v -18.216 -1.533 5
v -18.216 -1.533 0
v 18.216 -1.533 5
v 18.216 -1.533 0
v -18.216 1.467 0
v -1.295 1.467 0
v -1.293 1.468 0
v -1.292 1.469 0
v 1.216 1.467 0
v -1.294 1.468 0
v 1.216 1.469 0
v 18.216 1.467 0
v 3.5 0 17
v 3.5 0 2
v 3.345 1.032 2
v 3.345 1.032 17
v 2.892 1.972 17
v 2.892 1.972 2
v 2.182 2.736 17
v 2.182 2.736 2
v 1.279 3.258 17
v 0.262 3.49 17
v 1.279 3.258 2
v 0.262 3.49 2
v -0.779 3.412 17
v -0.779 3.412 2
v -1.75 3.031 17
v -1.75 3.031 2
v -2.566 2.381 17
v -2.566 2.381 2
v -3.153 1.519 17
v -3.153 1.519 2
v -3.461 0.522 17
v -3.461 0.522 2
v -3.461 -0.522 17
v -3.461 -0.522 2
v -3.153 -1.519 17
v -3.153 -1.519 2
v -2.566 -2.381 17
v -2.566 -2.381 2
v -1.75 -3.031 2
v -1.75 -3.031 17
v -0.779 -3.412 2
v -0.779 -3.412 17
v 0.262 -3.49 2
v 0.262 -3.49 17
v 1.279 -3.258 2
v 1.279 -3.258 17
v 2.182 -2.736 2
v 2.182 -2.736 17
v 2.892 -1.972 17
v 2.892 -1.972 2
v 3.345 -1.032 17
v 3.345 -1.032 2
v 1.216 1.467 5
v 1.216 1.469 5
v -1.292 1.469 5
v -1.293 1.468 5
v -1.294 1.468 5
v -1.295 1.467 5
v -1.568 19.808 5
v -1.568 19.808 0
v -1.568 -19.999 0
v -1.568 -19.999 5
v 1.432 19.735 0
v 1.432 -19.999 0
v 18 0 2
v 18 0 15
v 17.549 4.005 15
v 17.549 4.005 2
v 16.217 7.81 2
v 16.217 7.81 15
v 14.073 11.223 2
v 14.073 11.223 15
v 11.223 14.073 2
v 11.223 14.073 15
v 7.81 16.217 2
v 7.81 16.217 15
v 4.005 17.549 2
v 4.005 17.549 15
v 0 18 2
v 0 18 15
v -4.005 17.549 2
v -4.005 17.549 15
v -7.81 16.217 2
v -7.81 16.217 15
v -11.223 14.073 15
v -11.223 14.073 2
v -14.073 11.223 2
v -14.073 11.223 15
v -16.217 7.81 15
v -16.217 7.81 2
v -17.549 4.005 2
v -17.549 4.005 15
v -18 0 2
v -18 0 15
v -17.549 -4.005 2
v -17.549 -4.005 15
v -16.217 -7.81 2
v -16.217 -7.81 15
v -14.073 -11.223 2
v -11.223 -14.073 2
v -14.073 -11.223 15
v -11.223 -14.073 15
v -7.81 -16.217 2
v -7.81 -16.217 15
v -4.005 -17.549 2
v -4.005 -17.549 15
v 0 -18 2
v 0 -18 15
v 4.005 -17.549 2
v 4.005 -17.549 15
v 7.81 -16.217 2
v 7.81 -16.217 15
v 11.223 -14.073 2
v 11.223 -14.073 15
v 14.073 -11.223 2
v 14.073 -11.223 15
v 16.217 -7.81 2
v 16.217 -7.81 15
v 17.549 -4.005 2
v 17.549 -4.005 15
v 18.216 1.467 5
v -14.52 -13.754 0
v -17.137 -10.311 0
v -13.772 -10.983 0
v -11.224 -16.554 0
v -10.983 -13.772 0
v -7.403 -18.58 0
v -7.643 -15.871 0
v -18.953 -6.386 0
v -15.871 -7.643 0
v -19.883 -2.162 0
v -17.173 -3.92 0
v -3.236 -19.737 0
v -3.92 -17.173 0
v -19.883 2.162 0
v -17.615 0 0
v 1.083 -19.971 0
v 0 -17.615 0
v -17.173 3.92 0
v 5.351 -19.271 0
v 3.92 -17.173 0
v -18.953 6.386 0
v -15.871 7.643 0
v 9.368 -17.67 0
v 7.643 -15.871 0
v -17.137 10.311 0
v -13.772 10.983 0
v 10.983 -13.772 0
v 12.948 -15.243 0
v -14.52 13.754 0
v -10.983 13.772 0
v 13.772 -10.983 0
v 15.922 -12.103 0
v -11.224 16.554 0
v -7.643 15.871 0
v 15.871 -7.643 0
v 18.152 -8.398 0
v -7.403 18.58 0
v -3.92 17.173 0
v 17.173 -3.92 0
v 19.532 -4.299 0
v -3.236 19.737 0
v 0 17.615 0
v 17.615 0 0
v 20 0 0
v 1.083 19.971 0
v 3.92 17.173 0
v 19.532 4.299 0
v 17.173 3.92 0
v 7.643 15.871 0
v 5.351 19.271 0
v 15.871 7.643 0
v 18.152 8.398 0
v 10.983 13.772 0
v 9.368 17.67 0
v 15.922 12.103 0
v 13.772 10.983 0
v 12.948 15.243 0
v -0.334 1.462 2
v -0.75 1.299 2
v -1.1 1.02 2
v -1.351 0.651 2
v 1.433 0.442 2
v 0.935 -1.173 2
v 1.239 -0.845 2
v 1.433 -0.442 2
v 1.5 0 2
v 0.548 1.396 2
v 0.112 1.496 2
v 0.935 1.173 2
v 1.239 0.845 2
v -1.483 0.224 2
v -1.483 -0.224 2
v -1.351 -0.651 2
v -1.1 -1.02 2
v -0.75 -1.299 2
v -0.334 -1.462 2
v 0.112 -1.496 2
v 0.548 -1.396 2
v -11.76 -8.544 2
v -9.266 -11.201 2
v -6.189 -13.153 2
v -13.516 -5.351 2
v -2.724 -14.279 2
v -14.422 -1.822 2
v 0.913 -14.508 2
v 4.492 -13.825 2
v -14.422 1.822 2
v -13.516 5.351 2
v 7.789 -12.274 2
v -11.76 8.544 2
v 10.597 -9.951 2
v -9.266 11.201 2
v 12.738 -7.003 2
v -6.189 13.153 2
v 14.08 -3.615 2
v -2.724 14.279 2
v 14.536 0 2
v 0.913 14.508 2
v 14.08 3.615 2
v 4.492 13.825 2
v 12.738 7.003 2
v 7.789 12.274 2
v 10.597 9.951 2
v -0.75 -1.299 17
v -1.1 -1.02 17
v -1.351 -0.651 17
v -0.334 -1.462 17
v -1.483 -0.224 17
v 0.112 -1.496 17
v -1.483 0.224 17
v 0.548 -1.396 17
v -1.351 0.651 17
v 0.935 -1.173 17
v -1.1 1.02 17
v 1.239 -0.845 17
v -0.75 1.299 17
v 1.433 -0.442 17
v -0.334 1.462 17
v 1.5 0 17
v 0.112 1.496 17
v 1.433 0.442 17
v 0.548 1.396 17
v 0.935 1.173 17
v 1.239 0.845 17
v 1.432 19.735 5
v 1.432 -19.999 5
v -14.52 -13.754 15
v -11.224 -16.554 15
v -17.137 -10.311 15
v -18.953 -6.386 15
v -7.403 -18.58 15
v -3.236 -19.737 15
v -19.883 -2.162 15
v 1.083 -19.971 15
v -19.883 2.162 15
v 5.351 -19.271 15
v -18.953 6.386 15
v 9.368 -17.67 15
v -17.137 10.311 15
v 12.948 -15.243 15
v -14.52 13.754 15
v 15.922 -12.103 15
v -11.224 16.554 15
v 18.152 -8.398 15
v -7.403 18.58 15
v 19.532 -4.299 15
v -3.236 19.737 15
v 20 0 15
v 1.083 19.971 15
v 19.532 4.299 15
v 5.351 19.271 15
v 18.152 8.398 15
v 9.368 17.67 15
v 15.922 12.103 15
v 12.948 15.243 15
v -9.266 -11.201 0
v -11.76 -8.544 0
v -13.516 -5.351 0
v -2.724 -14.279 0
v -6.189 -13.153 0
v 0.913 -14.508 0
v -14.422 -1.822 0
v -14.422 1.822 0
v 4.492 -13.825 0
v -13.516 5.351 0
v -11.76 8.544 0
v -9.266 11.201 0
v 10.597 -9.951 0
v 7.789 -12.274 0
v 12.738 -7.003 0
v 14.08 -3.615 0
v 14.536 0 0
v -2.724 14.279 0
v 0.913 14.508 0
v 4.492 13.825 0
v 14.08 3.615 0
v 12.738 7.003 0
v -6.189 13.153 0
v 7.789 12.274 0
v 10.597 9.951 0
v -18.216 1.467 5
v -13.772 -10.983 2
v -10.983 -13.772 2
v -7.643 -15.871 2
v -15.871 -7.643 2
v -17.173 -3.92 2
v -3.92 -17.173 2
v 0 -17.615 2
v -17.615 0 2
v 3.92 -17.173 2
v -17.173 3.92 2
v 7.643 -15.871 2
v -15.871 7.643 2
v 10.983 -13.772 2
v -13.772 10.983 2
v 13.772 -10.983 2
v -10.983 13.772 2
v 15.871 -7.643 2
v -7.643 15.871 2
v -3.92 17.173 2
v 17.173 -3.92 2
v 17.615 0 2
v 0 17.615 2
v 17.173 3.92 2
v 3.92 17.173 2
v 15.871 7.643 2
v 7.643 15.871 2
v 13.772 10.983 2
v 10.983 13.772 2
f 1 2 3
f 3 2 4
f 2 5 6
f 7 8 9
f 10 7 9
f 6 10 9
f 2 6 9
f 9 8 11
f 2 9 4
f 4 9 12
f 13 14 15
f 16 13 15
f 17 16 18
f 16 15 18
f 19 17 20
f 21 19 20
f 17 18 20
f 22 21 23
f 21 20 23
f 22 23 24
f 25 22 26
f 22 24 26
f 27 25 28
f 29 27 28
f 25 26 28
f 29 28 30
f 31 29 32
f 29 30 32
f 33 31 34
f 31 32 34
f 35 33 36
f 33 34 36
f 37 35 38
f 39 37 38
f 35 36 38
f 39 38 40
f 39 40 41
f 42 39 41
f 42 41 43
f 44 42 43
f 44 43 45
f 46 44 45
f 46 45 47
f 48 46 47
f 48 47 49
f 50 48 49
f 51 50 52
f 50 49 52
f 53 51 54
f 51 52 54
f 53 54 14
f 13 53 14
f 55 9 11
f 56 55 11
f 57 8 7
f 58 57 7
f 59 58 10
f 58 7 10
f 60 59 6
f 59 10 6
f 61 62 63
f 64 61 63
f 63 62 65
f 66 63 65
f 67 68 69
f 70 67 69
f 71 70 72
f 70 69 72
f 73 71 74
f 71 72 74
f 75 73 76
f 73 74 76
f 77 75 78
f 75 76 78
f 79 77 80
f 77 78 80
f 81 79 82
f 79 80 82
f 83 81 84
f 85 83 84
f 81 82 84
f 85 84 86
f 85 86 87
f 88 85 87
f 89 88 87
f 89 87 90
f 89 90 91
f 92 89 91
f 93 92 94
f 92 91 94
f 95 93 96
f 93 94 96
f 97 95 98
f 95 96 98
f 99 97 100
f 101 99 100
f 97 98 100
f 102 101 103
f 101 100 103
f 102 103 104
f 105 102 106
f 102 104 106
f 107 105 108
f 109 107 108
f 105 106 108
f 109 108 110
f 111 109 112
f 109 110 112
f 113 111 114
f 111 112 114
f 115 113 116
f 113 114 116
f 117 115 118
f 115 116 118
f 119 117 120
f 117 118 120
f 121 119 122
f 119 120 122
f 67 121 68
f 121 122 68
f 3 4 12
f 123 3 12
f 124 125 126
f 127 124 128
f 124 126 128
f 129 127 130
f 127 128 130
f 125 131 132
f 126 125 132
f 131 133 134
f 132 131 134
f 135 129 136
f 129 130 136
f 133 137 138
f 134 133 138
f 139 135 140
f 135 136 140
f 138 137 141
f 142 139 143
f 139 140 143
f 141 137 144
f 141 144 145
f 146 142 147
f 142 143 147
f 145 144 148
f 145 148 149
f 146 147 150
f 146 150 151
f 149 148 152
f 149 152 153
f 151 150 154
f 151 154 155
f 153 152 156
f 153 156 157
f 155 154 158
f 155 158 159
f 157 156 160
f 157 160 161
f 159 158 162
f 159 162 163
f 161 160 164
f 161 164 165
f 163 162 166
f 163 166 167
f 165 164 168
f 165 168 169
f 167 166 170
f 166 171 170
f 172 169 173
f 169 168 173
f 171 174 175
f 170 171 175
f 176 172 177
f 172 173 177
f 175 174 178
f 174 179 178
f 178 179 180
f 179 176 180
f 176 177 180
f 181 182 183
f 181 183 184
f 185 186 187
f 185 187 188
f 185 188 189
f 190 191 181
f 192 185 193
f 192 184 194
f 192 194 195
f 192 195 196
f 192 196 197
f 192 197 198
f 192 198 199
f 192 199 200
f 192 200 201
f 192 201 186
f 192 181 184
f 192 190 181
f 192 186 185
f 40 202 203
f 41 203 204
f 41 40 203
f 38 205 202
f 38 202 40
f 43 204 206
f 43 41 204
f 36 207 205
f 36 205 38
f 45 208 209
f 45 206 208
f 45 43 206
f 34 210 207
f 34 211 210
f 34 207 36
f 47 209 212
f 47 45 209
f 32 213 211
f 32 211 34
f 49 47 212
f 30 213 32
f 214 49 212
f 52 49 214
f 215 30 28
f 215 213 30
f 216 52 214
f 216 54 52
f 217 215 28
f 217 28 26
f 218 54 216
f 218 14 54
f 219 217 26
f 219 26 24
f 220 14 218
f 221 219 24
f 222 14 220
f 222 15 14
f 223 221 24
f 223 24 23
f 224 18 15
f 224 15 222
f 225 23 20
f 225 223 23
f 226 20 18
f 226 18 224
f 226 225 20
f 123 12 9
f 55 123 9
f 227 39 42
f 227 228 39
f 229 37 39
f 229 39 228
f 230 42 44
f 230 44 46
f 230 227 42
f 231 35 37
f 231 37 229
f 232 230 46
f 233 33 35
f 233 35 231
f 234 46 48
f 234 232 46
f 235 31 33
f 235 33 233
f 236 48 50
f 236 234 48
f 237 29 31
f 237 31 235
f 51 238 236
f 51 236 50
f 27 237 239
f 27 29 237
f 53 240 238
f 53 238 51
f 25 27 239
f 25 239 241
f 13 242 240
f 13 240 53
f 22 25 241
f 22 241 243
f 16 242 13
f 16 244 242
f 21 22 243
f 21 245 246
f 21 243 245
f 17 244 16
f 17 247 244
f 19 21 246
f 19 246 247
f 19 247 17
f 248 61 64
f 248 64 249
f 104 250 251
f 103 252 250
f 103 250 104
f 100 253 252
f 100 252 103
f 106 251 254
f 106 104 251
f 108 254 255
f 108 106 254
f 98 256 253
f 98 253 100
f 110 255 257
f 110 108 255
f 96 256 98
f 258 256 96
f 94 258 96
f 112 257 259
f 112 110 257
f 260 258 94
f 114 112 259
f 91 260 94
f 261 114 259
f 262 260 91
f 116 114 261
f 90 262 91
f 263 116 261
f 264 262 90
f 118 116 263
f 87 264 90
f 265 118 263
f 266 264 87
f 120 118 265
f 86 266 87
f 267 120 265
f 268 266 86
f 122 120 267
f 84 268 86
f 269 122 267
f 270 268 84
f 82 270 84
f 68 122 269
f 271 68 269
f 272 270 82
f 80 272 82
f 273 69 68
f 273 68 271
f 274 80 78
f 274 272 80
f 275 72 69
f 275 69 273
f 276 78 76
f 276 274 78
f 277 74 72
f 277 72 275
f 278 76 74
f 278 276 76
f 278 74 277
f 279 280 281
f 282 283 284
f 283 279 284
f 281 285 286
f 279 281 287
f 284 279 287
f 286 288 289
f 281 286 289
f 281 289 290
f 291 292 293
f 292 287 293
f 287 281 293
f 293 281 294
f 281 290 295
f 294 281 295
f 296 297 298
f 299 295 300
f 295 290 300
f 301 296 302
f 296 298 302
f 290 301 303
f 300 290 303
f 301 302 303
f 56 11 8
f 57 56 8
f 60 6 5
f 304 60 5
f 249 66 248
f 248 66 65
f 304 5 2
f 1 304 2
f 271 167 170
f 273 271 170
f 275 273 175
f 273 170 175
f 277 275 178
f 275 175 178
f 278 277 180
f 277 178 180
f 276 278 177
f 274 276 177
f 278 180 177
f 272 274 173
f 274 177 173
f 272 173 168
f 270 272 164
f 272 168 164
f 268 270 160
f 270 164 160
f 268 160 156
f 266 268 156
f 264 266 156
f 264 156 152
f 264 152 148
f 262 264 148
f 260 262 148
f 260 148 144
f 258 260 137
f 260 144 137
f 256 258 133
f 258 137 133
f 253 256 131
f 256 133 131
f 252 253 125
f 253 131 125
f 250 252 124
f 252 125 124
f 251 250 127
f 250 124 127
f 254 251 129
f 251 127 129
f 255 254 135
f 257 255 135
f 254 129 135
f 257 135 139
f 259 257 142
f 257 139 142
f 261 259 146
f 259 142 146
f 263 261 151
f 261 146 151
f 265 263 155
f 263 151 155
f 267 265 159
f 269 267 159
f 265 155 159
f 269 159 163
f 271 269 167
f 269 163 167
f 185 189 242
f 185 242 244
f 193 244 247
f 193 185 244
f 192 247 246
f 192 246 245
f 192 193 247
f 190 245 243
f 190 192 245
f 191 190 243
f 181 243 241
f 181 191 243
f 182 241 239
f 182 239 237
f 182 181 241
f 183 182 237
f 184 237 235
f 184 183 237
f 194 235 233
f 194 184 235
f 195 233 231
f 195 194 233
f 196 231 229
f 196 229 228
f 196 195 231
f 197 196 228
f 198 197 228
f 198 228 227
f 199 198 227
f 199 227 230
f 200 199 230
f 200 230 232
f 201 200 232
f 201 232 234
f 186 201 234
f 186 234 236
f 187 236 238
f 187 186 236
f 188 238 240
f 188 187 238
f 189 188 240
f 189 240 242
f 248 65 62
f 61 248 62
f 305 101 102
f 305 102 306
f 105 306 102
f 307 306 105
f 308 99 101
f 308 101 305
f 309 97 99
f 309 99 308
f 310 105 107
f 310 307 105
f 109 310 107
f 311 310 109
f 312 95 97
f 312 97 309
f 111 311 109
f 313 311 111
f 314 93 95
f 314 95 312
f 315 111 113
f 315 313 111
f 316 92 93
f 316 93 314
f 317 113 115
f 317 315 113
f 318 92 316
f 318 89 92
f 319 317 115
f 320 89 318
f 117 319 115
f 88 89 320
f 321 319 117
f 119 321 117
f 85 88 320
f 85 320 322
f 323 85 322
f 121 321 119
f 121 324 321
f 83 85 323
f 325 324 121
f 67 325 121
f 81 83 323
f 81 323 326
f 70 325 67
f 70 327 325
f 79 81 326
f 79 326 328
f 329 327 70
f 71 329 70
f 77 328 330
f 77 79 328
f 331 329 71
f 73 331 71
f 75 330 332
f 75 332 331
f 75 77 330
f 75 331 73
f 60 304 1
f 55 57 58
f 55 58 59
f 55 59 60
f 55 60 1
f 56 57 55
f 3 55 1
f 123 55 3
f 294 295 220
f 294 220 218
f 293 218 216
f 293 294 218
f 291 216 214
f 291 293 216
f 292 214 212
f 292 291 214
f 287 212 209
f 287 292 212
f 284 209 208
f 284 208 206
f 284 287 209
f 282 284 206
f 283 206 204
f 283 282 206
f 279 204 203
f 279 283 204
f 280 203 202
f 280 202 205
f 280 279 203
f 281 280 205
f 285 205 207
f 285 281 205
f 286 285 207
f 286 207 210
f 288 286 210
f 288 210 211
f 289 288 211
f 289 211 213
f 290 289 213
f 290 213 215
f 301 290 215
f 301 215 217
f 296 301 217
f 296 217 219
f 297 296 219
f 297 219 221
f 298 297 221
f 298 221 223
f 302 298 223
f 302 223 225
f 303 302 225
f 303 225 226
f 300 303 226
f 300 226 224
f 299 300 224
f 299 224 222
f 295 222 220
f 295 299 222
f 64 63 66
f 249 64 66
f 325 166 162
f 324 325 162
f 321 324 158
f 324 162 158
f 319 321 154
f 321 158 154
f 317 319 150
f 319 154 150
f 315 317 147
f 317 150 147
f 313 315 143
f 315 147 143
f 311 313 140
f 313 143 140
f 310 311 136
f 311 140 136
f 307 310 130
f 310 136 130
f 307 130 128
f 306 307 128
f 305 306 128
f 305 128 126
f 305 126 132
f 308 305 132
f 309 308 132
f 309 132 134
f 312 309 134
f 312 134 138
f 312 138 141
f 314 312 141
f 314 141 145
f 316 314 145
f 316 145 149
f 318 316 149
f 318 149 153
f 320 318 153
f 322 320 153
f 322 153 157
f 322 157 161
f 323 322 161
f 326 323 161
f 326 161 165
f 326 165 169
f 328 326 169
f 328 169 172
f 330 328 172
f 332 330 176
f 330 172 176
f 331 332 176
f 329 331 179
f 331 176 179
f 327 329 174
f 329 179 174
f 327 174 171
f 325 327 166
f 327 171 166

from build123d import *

# Parameters (mm, degrees)
F0_R      = 20
F1_DEPTH  = 15
F2_R      = 18
F3_DEPTH  = 13
F4_R      = 3.5
F4_R_2    = 1.5
F5_DEPTH  = 15
F6_R      = 17.615069
F6_R_2    = 14.536454
F7_DEPTH  = 25
F8_DEPTH  = 25
F9_W      = 3
F9_H      = 19.99929
F10_DEPTH = 5
F12_DEPTH = 5


with BuildPart() as f1:
    # F0 (on Top) → F1 (new body)
    with BuildSketch(Plane.XY):
        Circle(F0_R)
    extrude(amount=F1_DEPTH)

    # F2 (on face) → F3 (cut)
    with BuildSketch(Plane.XY.offset(15)):
        Circle(F2_R)
    extrude(amount=-F3_DEPTH, mode=Mode.SUBTRACT)

    # F4 (on face) → F5 (join)
    with BuildSketch(Plane.XY.offset(2)):
        Circle(F4_R)
        Circle(F4_R_2, mode=Mode.SUBTRACT)
    extrude(amount=F5_DEPTH)

    # F6 (on face) → F7 (cut)
    with BuildSketch(Plane(origin=(0, 0, 0), x_dir=(1, 0, 0), z_dir=(0, 0, -1))):
        Circle(F6_R)
        Circle(F6_R_2, mode=Mode.SUBTRACT)
    extrude(amount=-F7_DEPTH, mode=Mode.SUBTRACT)

    # F6 (on face) → F8 (cut)
    with BuildSketch(Plane(origin=(0, 0, 0), x_dir=(1, 0, 0), z_dir=(0, 0, -1))):
        Circle(F6_R)
        Circle(F6_R_2, mode=Mode.SUBTRACT)
    extrude(amount=-F8_DEPTH, mode=Mode.SUBTRACT)


with BuildPart() as f10:
    # F9 (on Top) → F10 (new body)
    with BuildSketch(Plane.XY):
        Polygon((-1.567621, 19.808128), (-1.567621, 0), (1.432379, 0), (1.432379, 19.735267), align=None)
        with Locations((-0.067621, -9.999645)):
            Rectangle(F9_W, F9_H)
    extrude(amount=F10_DEPTH)


with BuildPart() as f12:
    # F11 (on Top) → F12 (new body)
    with BuildSketch(Plane.XY):
        with BuildLine():
            Line((-1.292468, -1.533205), (-1.292468, -1.469076))
            ThreePointArc((-1.292468, -1.469076), (-1.254497, -1.501632), (-1.215706, -1.533205))
            Line((-1.215706, -1.533205), (1.215706, -1.533205))
            Line((1.215706, -1.533205), (18.215706, -1.533205))
            Line((18.215706, -1.533205), (18.215706, 1.466795))
            Line((18.215706, 1.466795), (1.215706, 1.466795))
            Line((1.215706, 1.466795), (1.215706, 1.469076))
            Line((1.215706, 1.469076), (-1.292468, 1.469076))
            Line((-1.292468, 1.469076), (-1.292468, 1.466795))
            Line((-1.292468, 1.466795), (-1.295057, 1.466795))
            Line((-1.295057, 1.466795), (-18.215706, 1.466795))
            Line((-18.215706, 1.466795), (-18.215706, -1.533205))
            Line((-18.215706, -1.533205), (-1.292468, -1.533205))
        make_face()
        with BuildLine():
            ThreePointArc((-1.215706, -1.533205), (-1.254497, -1.501632), (-1.292468, -1.469076))
            Line((-1.292468, -1.469076), (-1.292468, -1.533205))
            Line((-1.292468, -1.533205), (-1.215706, -1.533205))
        make_face()
        with BuildLine():
            ThreePointArc((-1.292468, 1.469076), (-1.293763, 1.467936), (-1.295057, 1.466795))
            Line((-1.295057, 1.466795), (-1.292468, 1.466795))
            Line((-1.292468, 1.466795), (-1.292468, 1.469076))
        make_face()
    extrude(amount=F12_DEPTH)


solid = Compound([f1.part, f10.part, f12.part])
